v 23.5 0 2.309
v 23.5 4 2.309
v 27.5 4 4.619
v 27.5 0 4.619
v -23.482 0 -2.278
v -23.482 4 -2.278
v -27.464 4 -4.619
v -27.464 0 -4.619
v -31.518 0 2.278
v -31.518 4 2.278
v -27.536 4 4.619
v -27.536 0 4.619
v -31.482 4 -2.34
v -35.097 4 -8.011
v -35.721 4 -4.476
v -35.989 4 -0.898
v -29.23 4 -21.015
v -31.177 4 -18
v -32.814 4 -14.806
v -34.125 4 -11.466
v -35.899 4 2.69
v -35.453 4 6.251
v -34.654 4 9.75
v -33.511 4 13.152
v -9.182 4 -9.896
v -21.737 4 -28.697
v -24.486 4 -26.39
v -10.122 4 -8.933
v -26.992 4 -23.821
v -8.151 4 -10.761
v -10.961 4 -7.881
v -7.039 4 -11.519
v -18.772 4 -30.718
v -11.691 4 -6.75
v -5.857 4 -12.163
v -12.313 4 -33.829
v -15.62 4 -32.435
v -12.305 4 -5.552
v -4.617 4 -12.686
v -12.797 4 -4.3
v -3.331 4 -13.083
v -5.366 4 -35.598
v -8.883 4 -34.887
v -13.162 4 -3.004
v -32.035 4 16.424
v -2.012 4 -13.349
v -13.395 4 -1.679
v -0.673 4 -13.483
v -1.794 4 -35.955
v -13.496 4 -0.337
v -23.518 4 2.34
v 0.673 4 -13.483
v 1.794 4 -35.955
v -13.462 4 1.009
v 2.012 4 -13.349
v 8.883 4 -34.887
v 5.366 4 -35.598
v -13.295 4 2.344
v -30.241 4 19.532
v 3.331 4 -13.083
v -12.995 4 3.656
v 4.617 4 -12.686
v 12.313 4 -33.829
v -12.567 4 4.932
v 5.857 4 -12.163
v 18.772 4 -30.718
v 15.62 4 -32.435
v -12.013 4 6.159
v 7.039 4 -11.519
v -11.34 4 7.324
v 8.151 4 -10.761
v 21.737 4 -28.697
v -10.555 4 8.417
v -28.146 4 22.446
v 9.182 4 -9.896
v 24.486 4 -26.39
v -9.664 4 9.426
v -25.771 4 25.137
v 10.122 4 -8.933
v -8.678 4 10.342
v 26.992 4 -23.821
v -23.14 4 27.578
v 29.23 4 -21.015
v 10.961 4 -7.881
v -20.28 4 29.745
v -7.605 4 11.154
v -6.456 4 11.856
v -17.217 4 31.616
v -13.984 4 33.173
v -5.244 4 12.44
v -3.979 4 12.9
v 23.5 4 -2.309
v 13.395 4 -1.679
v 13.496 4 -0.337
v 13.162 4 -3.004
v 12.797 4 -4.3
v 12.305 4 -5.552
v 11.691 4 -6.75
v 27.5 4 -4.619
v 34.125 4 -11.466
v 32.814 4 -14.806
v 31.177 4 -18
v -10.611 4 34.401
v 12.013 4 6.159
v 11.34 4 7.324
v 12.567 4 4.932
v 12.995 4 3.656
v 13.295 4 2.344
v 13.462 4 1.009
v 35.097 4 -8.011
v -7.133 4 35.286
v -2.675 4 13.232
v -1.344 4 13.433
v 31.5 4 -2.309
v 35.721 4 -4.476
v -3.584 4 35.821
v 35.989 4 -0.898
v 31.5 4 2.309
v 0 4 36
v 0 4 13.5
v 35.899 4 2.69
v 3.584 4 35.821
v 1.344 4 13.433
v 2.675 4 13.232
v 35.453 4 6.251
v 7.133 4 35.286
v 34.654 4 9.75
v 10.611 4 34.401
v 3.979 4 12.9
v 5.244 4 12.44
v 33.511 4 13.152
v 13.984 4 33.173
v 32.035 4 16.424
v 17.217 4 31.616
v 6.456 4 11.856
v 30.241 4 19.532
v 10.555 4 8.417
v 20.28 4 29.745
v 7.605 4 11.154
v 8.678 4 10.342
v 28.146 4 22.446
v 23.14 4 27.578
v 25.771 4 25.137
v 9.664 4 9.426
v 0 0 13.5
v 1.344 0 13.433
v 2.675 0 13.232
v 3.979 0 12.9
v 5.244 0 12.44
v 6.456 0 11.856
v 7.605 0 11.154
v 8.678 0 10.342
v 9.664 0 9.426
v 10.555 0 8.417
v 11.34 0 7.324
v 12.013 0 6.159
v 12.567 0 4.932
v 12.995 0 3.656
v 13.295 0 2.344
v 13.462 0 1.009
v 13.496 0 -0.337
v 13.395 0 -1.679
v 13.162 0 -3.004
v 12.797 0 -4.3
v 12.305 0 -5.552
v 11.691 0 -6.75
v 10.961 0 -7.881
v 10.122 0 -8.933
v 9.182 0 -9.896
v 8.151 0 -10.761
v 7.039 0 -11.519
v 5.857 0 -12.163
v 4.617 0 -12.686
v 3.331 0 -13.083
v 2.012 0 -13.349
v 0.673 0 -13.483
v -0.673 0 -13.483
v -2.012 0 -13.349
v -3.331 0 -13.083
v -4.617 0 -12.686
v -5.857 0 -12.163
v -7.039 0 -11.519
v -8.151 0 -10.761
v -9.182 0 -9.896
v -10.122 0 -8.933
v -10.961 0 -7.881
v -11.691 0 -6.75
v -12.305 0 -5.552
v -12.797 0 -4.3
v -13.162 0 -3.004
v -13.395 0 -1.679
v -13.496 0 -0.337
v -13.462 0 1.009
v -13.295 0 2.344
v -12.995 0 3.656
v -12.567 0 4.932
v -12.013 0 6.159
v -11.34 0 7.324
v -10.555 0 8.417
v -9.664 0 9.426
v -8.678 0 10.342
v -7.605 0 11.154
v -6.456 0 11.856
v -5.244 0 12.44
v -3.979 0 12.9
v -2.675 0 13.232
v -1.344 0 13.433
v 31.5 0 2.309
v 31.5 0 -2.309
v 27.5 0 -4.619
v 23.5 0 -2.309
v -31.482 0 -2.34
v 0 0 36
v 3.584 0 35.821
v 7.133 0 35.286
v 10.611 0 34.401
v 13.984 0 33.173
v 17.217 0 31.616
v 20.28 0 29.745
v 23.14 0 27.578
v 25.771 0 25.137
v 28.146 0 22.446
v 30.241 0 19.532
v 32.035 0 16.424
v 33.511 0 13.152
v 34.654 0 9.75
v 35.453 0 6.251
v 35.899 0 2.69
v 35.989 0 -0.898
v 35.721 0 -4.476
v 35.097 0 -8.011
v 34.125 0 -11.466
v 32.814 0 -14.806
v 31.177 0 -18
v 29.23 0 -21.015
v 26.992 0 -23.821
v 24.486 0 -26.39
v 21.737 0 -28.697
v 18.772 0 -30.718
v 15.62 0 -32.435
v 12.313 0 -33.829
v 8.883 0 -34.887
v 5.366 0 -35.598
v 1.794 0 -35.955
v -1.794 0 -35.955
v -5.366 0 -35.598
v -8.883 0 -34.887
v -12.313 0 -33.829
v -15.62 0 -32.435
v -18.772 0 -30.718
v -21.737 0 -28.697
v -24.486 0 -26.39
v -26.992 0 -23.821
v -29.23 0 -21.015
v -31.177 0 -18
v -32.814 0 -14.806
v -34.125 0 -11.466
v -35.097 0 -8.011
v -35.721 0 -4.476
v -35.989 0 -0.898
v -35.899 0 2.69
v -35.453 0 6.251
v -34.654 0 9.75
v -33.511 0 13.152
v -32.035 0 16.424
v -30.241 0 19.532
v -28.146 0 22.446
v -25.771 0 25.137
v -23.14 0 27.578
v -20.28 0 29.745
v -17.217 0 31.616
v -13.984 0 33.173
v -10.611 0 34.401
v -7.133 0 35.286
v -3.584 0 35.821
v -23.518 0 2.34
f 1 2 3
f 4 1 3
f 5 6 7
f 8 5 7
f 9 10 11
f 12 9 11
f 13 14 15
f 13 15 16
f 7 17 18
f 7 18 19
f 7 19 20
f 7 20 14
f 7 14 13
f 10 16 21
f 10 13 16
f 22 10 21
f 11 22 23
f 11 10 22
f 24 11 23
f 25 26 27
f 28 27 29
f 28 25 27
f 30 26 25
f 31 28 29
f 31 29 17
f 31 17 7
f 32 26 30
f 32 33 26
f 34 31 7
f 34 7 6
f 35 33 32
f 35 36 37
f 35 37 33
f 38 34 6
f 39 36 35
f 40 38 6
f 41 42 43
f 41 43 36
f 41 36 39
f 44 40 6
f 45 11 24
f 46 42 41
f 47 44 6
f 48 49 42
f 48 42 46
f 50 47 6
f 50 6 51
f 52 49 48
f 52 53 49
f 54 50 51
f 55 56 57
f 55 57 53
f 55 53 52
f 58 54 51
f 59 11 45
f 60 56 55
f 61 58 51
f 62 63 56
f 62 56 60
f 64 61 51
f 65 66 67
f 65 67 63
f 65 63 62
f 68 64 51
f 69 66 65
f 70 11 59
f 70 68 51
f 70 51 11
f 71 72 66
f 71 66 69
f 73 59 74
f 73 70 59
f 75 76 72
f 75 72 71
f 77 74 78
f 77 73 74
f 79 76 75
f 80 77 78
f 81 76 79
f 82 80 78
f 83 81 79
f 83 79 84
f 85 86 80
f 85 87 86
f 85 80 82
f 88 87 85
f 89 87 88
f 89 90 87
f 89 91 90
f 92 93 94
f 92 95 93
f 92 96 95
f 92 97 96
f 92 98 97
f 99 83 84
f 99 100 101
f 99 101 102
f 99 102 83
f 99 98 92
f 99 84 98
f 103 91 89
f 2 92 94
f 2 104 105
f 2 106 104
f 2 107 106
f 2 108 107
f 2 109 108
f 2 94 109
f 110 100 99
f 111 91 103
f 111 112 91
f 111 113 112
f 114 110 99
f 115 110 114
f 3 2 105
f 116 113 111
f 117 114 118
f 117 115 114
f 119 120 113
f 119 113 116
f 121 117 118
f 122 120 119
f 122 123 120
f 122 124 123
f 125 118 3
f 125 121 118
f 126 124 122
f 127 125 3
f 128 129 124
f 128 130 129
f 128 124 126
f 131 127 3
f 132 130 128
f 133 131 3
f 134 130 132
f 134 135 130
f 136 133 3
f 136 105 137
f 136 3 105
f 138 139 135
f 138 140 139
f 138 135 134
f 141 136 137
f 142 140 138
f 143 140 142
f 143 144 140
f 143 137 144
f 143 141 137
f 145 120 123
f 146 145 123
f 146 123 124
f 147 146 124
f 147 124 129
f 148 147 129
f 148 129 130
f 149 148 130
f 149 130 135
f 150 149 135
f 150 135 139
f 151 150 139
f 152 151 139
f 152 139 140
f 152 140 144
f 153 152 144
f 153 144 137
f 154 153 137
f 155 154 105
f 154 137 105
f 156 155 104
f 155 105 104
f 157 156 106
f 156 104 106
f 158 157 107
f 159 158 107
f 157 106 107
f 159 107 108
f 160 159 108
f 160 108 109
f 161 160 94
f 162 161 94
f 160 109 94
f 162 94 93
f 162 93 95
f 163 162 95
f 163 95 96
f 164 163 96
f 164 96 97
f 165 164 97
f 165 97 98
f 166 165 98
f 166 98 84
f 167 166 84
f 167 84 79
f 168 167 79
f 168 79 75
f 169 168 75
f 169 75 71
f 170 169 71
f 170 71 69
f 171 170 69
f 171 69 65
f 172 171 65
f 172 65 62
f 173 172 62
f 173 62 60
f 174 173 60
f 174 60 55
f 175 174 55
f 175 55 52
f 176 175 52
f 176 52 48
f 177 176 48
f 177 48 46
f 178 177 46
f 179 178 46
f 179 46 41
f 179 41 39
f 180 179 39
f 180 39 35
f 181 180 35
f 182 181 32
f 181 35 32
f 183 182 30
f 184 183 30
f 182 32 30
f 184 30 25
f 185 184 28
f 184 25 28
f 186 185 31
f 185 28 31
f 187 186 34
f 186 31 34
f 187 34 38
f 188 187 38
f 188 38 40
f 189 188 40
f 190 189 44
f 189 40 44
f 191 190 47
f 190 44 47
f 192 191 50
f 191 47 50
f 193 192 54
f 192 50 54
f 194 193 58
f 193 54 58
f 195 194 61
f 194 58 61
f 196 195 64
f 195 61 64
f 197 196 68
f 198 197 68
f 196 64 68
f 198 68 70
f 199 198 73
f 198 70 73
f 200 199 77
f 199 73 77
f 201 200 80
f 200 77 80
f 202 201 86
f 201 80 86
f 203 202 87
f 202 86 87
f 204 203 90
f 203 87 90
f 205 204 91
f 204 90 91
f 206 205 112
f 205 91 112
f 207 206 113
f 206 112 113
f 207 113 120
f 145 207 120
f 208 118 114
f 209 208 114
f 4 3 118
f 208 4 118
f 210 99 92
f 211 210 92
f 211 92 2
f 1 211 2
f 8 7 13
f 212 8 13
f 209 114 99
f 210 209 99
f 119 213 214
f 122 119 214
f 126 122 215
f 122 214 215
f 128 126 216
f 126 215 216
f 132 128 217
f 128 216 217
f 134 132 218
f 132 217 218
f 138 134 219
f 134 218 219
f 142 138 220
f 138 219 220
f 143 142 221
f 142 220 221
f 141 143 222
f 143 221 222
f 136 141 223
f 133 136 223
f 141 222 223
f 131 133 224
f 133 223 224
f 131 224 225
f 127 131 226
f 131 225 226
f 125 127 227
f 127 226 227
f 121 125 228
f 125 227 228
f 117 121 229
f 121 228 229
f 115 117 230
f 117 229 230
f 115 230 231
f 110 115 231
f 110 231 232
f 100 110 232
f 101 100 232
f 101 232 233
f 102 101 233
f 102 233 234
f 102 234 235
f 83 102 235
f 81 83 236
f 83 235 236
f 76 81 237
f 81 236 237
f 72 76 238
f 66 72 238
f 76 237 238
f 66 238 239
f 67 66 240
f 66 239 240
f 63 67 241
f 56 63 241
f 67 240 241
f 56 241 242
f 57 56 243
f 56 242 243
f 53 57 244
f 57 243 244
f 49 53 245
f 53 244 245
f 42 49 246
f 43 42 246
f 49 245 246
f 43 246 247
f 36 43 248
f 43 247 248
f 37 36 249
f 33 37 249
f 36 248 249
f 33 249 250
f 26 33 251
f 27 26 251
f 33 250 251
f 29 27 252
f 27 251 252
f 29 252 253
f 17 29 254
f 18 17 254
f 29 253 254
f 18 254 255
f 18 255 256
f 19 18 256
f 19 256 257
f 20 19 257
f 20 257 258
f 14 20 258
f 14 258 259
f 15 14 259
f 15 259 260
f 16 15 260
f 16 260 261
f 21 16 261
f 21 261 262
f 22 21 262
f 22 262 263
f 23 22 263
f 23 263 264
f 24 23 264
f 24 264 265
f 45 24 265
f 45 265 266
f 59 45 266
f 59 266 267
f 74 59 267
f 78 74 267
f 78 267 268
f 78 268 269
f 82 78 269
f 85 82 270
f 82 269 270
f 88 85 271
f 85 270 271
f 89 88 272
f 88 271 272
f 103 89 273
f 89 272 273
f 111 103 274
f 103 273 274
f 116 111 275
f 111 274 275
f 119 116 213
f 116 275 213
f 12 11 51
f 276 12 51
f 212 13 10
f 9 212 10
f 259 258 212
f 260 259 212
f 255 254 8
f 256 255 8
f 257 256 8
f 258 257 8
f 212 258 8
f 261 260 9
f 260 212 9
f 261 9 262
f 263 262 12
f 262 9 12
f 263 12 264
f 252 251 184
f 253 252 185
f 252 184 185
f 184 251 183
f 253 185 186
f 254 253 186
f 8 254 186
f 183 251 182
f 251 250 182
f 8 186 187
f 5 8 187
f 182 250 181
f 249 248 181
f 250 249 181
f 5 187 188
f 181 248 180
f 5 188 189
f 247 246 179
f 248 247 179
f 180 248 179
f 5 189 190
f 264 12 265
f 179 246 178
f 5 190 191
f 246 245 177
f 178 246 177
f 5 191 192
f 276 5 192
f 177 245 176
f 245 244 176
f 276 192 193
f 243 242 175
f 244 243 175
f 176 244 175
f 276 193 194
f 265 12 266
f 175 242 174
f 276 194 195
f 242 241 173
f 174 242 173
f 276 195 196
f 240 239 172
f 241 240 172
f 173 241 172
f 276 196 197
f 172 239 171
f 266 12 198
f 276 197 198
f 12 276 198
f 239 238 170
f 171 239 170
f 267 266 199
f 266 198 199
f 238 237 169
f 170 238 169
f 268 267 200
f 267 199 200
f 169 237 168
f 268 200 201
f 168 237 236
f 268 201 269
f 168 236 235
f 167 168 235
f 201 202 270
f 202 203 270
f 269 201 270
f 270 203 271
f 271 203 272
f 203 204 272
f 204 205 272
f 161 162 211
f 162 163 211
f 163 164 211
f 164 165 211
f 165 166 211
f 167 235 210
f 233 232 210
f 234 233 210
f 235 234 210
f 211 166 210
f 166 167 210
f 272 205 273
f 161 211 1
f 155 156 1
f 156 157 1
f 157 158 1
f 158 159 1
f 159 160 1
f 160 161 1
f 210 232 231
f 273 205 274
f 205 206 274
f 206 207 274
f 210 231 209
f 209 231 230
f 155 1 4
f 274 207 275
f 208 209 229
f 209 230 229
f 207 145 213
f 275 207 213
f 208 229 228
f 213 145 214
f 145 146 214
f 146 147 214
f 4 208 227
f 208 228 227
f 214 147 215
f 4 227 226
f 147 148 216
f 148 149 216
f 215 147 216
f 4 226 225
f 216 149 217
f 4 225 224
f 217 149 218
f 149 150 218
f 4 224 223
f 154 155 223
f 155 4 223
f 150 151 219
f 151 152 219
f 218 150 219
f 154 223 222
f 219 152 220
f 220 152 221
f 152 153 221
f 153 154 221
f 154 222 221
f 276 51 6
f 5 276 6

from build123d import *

# Parameters (mm, degrees)
SKETCH1_R           = 36
BOSS_EXTRUDE1_DEPTH = 4
CUT_EXTRUDE1_DEPTH  = 52.068581339
SKETCH3_R           = 13.5
CUT_EXTRUDE2_DEPTH  = 52.068581339


with BuildPart() as part:
    # Sketch1 → Boss-Extrude1 (new body)
    with BuildSketch(Plane(origin=(0, 0, 0), x_dir=(1, 0, 0), z_dir=(0, 1, 0))):
        with Locations(Location((0, 0, 0), (0, 0, 270))):
            Circle(SKETCH1_R)
    extrude(amount=BOSS_EXTRUDE1_DEPTH)

    # Sketch2 → Cut-Extrude1 (cut, through all)
    with BuildSketch(Plane(origin=(0, 4, 0), x_dir=(1, 0, 0), z_dir=(0, 1, 0))):
        Polygon((-31.517749204, -2.278382028), (-27.535737886, -4.618663891), (-23.517988682, -2.340281863), (-23.482250796, 2.278382028), (-27.464262114, 4.618663891), (-31.482011318, 2.340281863), align=None)
        Polygon((27.5, -4.618802154), (31.5, -2.309401077), (31.5, 2.309401077), (27.5, 4.618802154), (23.5, 2.309401077), (23.5, -2.309401077), align=None)
    extrude(amount=-CUT_EXTRUDE1_DEPTH, mode=Mode.SUBTRACT)

    # Sketch3 → Cut-Extrude2 (cut, through all)
    with BuildSketch(Plane(origin=(0, 4, 0), x_dir=(1, 0, 0), z_dir=(0, 1, 0))):
        with Locations(Location((0, 0, 0), (0, 0, 270))):
            Circle(SKETCH3_R)
    extrude(amount=-CUT_EXTRUDE2_DEPTH, mode=Mode.SUBTRACT)


solid = part.part
